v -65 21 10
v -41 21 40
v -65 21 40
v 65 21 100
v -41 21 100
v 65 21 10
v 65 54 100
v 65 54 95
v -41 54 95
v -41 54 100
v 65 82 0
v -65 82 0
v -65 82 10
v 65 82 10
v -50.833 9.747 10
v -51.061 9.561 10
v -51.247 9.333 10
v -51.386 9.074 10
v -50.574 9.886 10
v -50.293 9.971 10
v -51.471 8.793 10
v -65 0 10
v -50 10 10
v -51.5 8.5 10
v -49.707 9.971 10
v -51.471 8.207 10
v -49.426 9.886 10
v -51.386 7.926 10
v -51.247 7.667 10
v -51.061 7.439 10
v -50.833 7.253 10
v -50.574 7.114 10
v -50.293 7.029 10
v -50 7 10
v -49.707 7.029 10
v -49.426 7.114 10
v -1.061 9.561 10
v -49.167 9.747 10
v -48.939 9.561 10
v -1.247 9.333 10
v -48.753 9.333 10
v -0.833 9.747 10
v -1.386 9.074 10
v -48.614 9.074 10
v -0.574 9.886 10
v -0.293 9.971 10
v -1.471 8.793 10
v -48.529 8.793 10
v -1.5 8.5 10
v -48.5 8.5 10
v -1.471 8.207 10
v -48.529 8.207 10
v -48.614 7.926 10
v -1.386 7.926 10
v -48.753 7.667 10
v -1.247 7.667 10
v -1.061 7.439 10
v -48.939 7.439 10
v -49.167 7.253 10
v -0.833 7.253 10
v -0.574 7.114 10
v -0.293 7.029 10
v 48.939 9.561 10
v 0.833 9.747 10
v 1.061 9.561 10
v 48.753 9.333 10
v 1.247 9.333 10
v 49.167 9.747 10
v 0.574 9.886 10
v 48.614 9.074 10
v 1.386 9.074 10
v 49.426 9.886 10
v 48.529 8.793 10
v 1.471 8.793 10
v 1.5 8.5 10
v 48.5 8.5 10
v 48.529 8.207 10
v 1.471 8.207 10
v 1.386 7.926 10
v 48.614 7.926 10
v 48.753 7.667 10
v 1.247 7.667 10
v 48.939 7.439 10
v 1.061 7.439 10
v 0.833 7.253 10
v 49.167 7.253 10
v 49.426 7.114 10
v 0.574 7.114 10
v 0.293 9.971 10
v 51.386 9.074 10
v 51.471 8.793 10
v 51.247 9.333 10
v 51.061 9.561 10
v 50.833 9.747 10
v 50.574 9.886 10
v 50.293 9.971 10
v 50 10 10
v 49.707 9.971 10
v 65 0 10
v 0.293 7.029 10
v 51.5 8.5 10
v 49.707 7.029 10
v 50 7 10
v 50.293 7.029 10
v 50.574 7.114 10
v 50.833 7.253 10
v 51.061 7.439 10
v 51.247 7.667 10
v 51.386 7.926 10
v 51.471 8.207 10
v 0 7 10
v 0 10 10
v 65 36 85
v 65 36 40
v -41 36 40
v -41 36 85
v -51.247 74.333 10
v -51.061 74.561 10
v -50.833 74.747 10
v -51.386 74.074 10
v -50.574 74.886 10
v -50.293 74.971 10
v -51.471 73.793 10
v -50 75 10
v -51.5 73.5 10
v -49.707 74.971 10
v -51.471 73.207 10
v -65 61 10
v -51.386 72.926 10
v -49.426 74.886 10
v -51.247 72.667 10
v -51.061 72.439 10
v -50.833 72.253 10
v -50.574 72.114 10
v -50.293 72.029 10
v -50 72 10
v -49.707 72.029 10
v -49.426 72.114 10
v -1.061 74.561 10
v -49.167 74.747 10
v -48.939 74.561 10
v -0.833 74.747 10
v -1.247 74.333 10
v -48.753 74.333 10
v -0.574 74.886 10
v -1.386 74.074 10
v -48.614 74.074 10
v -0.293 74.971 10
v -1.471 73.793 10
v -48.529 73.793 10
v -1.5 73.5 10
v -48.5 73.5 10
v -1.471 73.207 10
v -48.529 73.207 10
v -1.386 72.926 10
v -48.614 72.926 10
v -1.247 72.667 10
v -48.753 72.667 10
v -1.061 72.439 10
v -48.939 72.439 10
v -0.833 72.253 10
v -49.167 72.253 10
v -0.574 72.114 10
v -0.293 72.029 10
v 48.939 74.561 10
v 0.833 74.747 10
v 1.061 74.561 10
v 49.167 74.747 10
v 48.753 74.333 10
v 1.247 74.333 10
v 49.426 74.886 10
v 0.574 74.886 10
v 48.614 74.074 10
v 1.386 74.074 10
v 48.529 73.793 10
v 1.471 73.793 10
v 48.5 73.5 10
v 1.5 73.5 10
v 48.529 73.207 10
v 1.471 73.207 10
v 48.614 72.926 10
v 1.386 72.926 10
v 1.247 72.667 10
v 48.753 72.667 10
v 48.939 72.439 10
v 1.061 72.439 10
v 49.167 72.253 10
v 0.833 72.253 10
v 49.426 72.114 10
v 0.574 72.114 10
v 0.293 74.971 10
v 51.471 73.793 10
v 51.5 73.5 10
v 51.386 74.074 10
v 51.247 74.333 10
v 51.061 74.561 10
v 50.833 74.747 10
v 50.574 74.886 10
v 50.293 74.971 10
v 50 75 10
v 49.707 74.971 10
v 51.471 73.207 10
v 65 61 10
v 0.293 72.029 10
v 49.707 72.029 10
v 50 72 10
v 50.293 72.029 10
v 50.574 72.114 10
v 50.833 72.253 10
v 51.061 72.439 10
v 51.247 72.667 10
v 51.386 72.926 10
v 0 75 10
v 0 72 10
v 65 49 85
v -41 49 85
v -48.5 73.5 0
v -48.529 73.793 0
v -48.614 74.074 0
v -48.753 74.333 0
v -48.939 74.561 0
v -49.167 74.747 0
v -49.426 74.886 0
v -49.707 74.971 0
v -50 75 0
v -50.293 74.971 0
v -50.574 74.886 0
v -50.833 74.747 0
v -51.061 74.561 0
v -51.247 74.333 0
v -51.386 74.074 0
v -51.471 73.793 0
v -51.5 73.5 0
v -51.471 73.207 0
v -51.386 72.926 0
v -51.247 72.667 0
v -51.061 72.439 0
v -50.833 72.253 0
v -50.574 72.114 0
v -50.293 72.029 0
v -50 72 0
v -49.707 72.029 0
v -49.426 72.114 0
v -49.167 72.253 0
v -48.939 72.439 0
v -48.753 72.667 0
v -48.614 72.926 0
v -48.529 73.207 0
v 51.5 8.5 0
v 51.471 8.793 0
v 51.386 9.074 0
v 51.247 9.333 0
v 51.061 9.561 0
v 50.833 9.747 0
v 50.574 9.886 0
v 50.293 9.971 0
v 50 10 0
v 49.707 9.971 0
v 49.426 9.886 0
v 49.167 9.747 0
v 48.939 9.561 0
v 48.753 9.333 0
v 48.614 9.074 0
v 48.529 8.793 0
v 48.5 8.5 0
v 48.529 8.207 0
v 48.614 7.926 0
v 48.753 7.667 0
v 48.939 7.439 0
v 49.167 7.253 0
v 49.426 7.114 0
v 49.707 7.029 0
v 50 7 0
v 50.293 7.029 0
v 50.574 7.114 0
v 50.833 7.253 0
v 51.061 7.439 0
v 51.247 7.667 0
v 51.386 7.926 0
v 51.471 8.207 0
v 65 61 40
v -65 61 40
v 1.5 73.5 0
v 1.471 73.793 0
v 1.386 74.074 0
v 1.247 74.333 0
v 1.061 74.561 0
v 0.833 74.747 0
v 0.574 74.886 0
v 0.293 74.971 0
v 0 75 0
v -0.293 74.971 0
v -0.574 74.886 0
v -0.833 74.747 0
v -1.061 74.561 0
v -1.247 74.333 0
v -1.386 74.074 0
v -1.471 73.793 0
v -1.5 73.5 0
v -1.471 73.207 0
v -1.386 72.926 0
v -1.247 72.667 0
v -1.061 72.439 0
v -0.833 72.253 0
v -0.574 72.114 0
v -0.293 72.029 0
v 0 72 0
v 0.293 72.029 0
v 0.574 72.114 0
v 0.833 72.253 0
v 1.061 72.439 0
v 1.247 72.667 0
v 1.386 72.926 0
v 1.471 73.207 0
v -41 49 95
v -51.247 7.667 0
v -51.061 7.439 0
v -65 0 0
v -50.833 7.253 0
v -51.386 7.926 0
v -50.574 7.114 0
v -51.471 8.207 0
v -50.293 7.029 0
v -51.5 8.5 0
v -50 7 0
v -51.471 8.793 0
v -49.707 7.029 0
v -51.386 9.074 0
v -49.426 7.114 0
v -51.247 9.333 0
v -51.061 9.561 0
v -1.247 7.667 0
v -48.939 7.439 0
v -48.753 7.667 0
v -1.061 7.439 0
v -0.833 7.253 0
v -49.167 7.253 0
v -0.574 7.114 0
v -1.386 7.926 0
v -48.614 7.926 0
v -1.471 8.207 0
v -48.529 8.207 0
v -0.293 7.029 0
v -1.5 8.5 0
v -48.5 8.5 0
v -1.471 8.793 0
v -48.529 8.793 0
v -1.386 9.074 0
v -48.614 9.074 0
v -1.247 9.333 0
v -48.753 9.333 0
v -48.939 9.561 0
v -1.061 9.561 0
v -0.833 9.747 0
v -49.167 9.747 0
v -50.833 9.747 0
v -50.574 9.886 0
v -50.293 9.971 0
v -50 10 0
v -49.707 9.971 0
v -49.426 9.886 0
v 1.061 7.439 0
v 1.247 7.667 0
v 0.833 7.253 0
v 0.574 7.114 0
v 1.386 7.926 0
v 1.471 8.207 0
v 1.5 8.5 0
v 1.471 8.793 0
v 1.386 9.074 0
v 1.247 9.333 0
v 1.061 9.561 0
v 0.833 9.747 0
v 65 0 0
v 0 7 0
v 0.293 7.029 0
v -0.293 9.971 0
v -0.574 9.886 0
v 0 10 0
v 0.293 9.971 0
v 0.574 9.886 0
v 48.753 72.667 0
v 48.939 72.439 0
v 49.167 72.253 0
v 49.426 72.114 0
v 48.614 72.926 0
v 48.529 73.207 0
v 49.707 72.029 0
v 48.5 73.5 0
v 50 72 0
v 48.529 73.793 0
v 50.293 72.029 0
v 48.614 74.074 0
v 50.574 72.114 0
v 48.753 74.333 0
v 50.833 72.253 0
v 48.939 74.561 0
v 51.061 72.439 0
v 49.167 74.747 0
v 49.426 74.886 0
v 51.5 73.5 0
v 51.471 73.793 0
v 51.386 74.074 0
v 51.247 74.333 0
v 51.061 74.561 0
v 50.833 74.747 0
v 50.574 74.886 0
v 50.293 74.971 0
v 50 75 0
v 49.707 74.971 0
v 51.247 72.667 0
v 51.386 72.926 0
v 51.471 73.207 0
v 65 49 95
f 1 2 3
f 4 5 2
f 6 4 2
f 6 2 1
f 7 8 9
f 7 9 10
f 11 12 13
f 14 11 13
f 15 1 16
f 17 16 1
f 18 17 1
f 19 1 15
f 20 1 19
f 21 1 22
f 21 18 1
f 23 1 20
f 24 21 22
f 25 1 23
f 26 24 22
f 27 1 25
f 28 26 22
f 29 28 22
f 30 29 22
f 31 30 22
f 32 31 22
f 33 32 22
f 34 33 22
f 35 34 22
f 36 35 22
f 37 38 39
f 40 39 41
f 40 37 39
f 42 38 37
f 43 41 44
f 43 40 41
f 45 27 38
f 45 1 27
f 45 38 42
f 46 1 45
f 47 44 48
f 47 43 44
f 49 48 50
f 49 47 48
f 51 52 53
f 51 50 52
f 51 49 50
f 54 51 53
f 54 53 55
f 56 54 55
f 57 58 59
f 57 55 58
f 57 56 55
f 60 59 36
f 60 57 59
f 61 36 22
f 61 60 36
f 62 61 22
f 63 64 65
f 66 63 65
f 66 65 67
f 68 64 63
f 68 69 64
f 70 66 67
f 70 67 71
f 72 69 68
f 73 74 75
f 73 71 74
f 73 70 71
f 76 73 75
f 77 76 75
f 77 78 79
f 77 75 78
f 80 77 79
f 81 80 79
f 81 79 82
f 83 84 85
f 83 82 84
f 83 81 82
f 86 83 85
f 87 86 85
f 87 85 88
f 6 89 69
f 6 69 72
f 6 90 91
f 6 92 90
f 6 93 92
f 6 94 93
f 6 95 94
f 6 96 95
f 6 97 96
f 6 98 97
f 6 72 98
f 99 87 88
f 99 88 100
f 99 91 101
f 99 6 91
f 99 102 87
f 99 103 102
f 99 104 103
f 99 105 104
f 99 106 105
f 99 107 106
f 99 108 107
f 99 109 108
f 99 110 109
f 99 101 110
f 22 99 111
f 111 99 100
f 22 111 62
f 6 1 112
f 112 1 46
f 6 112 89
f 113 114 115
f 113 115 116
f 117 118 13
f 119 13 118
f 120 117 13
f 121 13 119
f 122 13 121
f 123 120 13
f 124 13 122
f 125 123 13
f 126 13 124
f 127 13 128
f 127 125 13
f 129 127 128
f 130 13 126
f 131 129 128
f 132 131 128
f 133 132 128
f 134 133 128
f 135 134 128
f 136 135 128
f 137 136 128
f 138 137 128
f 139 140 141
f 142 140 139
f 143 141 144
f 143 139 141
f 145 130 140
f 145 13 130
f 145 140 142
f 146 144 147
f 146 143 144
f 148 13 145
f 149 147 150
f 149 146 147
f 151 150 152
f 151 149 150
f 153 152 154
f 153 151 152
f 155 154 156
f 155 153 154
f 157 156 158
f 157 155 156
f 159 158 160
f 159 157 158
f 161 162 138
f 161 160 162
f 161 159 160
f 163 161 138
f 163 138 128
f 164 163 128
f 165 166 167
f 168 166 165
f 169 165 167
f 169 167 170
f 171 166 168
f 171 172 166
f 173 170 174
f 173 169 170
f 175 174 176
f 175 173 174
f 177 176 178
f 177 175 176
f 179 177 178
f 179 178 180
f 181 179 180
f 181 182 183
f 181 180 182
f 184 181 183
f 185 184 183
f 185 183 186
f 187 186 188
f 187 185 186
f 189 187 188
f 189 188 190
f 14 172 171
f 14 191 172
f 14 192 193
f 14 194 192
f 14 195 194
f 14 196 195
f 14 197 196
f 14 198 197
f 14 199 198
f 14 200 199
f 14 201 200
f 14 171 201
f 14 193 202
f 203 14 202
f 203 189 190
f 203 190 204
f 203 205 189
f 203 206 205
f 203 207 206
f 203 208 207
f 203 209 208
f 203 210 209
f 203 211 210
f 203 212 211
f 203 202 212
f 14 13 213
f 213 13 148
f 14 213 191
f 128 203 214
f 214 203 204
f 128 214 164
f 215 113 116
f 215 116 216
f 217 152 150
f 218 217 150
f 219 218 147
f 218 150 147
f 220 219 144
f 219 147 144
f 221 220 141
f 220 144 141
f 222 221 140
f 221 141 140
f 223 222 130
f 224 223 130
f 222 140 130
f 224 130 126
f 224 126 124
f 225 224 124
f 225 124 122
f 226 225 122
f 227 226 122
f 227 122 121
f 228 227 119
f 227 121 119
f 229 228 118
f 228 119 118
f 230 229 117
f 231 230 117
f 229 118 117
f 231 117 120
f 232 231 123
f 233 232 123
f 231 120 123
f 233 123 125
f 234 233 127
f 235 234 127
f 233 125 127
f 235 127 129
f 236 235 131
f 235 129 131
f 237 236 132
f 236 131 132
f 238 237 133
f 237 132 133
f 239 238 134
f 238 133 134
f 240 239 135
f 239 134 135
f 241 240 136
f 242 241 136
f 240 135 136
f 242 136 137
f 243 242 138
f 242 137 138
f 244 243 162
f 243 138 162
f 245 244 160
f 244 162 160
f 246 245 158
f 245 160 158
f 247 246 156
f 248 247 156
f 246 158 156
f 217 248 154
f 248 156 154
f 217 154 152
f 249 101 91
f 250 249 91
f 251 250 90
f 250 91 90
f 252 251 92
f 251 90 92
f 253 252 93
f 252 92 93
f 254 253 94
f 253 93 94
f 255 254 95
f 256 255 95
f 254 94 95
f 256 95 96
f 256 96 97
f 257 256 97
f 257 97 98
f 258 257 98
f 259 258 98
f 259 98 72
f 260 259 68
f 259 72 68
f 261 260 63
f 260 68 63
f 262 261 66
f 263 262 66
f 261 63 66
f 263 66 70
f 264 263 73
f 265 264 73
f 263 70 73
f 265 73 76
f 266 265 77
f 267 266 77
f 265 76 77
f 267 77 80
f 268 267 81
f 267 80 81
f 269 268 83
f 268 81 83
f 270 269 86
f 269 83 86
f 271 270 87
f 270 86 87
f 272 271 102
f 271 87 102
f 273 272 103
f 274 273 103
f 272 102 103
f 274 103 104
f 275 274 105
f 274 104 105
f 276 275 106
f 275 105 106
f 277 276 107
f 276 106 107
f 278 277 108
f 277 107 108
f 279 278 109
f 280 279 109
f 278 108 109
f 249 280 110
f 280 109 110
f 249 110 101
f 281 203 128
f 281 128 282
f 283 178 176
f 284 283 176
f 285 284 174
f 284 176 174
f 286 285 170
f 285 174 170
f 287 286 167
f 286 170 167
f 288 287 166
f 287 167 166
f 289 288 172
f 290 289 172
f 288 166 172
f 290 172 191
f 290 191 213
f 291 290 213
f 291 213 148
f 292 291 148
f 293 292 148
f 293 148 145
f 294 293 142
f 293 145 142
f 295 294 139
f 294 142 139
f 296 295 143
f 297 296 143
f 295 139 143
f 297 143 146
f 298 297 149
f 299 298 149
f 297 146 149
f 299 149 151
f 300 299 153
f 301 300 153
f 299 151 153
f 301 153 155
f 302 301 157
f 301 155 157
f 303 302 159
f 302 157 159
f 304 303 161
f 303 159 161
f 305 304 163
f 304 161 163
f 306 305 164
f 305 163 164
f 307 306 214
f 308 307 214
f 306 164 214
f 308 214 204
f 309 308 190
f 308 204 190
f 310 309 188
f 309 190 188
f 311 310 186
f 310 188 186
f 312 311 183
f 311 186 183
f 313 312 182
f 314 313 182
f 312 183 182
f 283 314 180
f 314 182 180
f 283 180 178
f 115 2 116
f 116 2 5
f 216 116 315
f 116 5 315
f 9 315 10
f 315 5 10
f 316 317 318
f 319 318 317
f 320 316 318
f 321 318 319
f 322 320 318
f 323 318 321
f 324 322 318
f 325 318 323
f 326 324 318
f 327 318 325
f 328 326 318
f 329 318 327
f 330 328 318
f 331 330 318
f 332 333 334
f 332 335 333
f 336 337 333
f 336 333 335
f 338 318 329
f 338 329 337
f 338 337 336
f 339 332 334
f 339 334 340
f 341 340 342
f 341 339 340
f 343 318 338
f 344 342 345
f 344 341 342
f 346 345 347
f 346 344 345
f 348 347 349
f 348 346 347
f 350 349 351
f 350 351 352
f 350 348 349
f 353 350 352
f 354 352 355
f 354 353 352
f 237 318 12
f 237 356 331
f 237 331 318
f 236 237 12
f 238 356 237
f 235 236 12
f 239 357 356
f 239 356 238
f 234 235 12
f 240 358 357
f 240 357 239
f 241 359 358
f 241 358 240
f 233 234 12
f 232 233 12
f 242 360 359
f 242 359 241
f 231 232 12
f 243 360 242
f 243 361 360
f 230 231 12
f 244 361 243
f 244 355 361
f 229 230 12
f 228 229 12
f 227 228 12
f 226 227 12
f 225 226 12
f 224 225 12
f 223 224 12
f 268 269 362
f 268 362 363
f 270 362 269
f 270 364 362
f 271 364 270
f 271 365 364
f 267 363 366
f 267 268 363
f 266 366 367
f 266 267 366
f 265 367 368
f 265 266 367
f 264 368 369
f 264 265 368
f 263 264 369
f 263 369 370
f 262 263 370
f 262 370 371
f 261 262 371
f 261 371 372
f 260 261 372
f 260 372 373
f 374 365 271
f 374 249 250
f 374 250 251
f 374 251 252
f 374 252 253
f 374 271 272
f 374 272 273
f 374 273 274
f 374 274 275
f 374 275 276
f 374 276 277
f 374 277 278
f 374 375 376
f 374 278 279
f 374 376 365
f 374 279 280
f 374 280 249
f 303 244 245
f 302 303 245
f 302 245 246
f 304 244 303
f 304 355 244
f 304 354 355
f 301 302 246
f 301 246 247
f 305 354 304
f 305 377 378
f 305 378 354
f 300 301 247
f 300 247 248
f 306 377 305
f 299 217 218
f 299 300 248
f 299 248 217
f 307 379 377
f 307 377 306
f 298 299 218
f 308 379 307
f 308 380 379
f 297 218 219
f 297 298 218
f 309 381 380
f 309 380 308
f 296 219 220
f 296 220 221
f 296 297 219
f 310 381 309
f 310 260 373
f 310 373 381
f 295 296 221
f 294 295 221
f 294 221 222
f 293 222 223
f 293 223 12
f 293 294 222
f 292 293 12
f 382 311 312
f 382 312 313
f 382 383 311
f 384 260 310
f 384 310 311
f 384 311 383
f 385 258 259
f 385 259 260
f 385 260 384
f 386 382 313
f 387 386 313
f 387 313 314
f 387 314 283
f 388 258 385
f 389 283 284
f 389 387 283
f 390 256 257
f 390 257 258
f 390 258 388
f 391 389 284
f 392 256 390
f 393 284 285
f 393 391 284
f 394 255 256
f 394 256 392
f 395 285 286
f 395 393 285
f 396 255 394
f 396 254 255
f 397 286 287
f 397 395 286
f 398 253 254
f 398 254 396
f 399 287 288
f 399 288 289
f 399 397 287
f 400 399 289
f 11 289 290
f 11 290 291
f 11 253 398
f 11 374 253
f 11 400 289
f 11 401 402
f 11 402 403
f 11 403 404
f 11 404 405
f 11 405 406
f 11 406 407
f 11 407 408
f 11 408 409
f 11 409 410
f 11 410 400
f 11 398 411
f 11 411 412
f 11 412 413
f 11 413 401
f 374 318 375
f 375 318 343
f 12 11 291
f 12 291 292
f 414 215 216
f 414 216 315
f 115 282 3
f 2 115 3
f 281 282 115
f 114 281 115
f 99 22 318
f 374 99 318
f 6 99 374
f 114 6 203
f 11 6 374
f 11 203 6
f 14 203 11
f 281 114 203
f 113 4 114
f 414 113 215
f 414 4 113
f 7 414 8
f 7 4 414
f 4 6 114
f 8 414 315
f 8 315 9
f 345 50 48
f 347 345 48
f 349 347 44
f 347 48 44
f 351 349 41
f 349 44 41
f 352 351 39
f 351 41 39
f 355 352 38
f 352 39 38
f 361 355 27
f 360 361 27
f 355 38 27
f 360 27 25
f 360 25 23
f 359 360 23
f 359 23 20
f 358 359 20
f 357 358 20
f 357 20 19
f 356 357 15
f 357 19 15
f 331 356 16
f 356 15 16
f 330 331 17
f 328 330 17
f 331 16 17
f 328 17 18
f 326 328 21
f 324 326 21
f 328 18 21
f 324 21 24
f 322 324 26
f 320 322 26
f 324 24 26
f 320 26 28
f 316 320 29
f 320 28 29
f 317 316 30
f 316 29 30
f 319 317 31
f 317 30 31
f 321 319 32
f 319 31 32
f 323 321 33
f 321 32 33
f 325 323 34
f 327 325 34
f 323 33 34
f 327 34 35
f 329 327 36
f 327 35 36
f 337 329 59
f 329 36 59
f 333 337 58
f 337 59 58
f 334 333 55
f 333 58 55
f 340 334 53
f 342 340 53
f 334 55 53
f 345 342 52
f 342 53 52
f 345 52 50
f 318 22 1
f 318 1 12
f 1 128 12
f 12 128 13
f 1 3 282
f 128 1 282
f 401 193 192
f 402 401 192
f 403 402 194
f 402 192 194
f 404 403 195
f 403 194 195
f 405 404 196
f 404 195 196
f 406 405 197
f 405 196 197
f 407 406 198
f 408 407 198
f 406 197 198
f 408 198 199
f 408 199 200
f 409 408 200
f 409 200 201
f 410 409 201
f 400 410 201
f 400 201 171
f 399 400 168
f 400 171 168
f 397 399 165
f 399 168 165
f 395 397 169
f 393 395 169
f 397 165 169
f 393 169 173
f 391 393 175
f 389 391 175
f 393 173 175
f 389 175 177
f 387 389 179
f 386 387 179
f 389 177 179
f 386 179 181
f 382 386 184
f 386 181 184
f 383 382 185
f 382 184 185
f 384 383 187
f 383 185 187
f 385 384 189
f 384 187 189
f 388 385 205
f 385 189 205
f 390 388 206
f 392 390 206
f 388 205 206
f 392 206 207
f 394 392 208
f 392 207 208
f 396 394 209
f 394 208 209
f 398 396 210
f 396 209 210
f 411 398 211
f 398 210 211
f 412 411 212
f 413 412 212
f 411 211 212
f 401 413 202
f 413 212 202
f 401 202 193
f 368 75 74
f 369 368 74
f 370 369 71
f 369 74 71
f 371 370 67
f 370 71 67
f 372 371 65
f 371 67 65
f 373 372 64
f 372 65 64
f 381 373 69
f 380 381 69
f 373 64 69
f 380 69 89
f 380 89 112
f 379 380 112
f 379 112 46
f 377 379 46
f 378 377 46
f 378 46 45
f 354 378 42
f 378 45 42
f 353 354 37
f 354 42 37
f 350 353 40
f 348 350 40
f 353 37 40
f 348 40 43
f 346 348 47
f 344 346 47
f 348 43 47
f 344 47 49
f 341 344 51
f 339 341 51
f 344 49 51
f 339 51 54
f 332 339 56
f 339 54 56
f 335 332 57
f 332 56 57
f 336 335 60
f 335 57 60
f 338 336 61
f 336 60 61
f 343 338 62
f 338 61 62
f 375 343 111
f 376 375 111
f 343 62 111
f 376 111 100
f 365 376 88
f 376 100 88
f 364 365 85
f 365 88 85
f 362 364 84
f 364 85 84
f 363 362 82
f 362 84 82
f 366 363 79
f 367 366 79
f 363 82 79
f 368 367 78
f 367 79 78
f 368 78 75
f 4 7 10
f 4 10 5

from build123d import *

# Parameters (mm, degrees)
F1_DEPTH      = 65
F1_DEPTH_BACK = 65
F3_DEPTH      = 106
F4_R          = 1.5
F5_DEPTH      = 10


with BuildPart() as f1:
    # F0 (on Right) → F1 (new body, two sides)
    with BuildSketch(Plane.YZ) as f1_sk:
        Polygon((0, 10), (0, 0), (82, 0), (82, 10), (61, 10), (61, 40), (21, 40), (21, 10), align=None)
    extrude(amount=F1_DEPTH)
    extrude(f1_sk.sketch, amount=-F1_DEPTH_BACK)

    # F2 (on face) → F3 (join)
    with BuildSketch(Plane.YZ.offset(65)):
        Polygon((21, 100), (21, 40), (36, 40), (36, 85), (49, 85), (49, 95), (54, 95), (54, 100), align=None)
    extrude(amount=-F3_DEPTH)

    # F4 (on face) → F5 (cut)
    with BuildSketch(Plane.XY.offset(10)):
        with Locations((-50, 73.5)):
            Circle(F4_R)
        with Locations((0, 73.5)):
            Circle(F4_R)
        with Locations((50, 73.5)):
            Circle(F4_R)
        with Locations((50, 8.5)):
            Circle(F4_R)
        with Locations((0, 8.5)):
            Circle(F4_R)
        with Locations((-50, 8.5)):
            Circle(F4_R)
    extrude(amount=-F5_DEPTH, mode=Mode.SUBTRACT)


solid = f1.part
